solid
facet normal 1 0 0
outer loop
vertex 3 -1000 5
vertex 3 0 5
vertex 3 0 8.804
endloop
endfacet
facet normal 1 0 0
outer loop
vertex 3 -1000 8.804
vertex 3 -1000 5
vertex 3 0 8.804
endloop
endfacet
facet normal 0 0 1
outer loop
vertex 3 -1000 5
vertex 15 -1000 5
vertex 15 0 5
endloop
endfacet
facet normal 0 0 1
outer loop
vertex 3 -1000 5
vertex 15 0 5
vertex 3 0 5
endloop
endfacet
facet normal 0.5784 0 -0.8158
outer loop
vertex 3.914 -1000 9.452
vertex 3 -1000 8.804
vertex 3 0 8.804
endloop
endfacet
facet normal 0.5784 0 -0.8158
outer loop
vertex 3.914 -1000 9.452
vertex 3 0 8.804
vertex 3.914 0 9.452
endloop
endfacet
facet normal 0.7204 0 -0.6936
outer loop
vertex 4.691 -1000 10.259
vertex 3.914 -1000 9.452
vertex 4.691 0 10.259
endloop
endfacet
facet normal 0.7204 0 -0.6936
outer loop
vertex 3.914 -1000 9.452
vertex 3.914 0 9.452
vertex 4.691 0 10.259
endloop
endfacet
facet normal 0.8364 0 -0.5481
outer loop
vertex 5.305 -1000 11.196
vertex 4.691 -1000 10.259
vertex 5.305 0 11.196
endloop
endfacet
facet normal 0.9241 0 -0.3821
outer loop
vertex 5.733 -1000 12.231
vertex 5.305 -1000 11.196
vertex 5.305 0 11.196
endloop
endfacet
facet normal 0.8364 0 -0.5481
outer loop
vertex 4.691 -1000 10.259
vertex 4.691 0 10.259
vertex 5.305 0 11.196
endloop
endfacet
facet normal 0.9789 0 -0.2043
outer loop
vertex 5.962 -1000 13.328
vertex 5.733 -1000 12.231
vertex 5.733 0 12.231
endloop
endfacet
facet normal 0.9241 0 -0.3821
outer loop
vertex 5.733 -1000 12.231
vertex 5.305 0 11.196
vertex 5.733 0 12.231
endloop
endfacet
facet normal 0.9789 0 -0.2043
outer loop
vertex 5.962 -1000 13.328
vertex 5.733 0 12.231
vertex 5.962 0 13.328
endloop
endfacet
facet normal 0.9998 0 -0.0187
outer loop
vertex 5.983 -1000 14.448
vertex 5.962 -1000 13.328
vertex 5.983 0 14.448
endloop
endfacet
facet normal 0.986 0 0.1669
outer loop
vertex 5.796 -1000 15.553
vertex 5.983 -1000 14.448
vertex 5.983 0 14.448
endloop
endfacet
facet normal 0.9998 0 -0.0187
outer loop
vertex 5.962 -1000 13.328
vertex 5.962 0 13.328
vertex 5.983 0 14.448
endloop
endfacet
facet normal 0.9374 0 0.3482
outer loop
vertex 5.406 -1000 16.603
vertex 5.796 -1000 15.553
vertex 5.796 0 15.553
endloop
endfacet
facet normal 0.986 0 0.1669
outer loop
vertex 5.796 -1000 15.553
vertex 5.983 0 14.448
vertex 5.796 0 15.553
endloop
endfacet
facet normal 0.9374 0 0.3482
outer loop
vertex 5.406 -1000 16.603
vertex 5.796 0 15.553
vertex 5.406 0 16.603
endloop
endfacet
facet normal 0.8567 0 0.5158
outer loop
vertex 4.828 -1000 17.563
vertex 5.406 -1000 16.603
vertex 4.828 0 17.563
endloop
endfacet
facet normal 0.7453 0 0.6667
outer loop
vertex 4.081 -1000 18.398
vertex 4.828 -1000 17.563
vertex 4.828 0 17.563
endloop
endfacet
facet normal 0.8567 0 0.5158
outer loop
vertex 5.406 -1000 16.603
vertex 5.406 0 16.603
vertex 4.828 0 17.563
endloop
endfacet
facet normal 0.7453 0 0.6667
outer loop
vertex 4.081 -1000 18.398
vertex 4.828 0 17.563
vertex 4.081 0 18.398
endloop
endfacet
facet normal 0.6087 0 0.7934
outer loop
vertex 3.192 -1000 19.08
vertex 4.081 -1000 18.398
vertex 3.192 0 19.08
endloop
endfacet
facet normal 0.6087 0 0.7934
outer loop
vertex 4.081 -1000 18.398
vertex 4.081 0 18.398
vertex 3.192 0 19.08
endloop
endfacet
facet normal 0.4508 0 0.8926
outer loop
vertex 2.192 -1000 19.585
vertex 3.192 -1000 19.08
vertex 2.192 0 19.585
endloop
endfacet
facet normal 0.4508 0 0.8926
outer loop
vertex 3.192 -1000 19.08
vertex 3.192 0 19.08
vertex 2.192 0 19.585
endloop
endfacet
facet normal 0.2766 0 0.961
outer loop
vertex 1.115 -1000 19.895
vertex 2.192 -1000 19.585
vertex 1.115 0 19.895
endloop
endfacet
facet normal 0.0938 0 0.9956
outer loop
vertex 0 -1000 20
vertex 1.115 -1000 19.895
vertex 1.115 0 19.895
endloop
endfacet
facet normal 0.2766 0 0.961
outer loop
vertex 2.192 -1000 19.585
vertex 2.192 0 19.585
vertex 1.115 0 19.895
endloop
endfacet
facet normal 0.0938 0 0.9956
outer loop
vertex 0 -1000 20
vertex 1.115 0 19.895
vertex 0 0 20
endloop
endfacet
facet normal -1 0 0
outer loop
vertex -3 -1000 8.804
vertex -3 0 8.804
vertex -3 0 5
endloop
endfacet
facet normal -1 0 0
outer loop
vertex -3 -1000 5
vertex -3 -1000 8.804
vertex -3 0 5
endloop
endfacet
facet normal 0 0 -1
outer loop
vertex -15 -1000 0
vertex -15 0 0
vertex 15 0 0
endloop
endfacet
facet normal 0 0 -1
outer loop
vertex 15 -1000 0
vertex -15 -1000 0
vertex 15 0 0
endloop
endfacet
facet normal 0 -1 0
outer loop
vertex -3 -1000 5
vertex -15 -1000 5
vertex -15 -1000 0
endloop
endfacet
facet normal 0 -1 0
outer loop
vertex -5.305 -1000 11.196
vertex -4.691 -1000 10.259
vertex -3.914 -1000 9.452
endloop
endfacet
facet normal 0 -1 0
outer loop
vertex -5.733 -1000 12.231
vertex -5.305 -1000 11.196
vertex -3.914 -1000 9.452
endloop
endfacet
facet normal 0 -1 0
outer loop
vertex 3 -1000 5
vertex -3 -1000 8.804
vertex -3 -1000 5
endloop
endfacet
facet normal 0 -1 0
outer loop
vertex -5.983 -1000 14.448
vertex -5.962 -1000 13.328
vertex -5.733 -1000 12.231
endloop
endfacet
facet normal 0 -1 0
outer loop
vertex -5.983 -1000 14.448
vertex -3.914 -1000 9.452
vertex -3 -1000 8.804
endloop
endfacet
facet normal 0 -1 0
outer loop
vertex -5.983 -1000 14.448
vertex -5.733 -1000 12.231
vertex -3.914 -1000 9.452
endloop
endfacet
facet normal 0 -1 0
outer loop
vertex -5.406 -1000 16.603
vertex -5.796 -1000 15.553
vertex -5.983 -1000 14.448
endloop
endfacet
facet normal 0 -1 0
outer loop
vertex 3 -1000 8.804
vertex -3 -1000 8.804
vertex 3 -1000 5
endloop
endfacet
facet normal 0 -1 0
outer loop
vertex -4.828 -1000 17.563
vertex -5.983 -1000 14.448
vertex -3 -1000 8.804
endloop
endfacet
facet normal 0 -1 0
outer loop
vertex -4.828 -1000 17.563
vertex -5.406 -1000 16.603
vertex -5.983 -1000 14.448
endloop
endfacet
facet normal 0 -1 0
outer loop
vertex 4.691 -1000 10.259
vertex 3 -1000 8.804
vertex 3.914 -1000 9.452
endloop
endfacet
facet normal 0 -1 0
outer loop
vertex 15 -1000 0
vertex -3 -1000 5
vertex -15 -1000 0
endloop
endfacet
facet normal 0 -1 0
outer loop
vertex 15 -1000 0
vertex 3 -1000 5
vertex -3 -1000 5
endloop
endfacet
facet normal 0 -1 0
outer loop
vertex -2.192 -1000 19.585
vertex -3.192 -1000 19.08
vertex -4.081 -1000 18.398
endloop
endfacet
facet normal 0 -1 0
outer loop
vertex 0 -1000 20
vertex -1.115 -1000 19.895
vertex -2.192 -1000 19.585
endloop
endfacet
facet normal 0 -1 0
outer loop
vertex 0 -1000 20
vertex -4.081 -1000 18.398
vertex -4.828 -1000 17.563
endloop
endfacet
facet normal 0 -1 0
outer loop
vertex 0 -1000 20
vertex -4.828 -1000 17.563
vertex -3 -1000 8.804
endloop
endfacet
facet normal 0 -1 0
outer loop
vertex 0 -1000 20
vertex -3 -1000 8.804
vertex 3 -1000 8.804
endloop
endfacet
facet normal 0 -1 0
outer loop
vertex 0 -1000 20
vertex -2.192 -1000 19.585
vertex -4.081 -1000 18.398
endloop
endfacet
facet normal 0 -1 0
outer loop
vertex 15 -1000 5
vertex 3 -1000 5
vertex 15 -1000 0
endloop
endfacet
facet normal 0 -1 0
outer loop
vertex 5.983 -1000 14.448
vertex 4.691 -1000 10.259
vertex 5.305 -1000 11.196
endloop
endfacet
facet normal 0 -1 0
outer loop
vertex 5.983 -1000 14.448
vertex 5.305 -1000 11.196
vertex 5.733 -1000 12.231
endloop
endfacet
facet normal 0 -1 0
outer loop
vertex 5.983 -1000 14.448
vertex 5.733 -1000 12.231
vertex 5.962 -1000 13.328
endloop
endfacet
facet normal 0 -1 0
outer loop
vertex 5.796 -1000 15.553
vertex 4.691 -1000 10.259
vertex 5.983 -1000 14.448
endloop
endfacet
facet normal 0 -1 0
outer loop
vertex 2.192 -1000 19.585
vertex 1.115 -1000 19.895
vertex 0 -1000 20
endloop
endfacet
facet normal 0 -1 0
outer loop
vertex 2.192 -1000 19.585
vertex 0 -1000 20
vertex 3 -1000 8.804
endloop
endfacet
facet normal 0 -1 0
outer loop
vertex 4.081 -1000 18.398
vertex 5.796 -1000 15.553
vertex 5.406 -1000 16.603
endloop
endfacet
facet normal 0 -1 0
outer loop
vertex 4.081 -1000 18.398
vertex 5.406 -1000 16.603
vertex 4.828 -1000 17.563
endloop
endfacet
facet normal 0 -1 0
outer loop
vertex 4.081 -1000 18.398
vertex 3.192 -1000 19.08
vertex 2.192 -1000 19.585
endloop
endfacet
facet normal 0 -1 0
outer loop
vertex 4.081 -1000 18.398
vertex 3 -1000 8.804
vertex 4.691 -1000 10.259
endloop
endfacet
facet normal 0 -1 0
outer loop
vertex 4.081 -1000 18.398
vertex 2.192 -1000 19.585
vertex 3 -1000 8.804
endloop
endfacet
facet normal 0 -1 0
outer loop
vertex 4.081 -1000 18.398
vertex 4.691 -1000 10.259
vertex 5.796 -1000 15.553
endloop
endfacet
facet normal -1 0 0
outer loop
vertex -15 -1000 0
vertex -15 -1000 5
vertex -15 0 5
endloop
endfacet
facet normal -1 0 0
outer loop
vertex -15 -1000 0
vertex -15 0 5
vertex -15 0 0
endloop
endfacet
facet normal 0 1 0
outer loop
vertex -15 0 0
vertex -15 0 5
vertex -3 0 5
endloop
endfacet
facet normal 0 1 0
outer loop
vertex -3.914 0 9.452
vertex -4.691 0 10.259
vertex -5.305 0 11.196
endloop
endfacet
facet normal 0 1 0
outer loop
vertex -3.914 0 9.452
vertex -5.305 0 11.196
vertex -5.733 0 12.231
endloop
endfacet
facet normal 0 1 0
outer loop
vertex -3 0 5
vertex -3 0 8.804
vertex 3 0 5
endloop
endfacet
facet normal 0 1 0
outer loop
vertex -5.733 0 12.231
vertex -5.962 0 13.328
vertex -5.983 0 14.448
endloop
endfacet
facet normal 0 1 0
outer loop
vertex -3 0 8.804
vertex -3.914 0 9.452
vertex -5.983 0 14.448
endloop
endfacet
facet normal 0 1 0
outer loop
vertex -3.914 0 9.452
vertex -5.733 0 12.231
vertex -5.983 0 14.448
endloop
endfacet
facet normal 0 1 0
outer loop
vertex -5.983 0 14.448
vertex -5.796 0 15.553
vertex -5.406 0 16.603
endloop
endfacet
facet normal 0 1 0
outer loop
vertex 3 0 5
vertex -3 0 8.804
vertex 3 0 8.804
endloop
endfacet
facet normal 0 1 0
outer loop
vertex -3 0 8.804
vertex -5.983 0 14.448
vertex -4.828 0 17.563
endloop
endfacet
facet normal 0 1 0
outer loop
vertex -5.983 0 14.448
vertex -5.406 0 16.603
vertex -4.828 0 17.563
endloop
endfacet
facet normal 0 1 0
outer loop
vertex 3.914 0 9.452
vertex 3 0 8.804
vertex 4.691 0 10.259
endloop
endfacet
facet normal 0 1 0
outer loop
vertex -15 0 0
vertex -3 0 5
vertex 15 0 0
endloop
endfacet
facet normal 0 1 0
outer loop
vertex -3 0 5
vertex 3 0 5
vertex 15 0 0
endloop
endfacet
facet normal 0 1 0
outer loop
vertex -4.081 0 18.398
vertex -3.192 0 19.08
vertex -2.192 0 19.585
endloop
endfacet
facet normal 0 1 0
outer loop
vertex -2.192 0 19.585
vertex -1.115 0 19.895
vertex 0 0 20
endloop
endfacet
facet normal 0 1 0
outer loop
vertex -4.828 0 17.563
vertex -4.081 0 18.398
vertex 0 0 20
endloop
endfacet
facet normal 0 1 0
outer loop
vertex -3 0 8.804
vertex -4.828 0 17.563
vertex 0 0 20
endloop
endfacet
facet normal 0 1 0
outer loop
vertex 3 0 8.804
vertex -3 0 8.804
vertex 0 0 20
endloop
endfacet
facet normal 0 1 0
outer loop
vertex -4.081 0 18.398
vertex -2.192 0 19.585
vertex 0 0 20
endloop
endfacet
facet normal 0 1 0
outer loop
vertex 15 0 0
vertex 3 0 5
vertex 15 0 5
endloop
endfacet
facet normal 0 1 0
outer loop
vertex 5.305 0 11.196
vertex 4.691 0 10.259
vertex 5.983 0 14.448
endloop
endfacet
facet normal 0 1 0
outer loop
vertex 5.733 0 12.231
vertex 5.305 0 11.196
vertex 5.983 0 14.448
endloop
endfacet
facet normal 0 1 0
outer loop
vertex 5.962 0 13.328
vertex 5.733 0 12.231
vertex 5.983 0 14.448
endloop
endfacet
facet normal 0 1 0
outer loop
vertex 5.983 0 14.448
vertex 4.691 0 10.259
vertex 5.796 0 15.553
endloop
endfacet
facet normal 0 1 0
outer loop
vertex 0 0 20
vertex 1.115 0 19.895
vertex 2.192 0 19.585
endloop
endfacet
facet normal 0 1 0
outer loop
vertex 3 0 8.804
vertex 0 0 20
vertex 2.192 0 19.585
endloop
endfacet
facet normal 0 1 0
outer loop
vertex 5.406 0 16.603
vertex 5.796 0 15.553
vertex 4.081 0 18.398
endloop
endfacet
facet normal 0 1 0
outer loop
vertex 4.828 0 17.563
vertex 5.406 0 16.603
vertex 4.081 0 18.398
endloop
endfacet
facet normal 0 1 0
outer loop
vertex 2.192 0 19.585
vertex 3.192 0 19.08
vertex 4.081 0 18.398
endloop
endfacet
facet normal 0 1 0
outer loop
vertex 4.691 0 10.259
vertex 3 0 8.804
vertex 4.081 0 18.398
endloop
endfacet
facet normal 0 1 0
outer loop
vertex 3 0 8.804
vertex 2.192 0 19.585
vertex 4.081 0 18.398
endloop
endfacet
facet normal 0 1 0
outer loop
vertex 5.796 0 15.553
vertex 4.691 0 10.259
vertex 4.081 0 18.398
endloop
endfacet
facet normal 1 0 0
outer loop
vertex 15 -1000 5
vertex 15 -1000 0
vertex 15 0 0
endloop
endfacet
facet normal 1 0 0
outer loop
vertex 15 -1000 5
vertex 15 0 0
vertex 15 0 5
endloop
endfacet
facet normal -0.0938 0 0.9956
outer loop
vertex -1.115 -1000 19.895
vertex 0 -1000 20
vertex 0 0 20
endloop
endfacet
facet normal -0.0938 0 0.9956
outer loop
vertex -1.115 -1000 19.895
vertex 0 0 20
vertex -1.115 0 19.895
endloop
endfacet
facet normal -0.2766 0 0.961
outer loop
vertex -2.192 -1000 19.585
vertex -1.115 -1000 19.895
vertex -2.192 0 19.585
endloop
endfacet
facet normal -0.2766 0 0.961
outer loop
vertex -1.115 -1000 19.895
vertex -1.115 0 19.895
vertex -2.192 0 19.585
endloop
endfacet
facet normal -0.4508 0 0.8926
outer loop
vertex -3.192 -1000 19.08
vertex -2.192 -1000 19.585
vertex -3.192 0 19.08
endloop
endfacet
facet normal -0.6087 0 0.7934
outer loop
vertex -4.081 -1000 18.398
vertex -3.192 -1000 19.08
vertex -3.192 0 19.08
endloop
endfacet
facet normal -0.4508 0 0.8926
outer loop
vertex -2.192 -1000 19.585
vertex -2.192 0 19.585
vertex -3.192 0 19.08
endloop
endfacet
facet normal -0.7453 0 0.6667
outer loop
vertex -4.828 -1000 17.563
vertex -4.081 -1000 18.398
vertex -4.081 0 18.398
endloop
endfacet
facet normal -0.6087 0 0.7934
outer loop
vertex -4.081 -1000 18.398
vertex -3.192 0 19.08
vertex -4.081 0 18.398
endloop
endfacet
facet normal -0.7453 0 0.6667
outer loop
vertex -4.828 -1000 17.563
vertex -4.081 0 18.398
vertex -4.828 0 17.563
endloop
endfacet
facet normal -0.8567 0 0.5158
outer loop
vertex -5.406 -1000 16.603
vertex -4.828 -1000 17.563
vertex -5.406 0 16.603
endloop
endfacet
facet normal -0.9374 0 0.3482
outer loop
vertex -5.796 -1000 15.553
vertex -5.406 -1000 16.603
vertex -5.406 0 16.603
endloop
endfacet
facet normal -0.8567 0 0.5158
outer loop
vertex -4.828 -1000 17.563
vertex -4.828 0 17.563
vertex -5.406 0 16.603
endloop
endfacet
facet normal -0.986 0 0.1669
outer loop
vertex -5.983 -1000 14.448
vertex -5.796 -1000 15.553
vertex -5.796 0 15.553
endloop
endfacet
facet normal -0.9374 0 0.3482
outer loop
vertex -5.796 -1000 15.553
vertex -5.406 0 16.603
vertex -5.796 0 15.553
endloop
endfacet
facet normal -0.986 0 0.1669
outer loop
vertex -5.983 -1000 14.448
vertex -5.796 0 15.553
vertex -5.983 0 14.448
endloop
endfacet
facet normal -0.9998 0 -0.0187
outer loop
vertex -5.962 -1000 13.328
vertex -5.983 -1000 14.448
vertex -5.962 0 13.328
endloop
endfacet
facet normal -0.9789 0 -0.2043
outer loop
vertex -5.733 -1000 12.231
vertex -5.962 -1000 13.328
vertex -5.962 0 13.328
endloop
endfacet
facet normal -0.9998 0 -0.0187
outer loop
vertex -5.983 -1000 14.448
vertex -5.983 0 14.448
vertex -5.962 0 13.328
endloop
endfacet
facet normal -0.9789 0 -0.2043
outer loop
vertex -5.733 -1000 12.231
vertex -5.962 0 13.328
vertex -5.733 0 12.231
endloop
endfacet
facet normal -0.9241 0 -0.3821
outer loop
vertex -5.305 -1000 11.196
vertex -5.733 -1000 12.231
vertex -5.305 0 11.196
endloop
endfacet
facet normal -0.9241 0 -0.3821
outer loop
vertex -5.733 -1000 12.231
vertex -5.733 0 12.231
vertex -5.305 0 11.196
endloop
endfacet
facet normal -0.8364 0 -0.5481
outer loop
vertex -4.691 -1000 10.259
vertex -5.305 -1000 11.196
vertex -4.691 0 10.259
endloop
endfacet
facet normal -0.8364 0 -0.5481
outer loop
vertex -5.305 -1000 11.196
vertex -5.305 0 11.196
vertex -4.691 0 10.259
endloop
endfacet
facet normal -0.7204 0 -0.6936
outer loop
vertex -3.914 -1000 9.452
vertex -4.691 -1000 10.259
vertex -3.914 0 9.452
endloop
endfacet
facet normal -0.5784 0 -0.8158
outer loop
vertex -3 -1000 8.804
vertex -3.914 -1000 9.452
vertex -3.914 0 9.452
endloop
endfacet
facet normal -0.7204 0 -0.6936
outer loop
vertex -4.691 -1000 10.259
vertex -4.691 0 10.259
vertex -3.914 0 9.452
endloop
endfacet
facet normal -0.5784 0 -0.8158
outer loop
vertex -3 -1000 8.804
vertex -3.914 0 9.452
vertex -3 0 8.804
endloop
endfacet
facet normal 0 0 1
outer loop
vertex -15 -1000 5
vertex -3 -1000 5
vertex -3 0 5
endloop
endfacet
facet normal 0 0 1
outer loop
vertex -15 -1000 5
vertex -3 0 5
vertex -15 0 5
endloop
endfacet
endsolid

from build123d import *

# Parameters (mm, degrees)
F1_DEPTH = 1000


with BuildPart() as f1:
    # F0 (on Front) → F1 (new body)
    with BuildSketch(Plane.XZ):
        with BuildLine():
            Line((-15, 0), (0, 0))
            Line((0, 0), (15, 0))
            Line((15, 0), (15, 5))
            Line((15, 5), (3, 5))
            Line((3, 5), (3, 8.803848))
            ThreePointArc((3, 8.803848), (5.795555, 15.552914), (0, 20))
            ThreePointArc((0, 20), (-5.795555, 15.552914), (-3, 8.803848))
            Line((-3, 8.803848), (-3, 5))
            Line((-3, 5), (-15, 5))
            Line((-15, 5), (-15, 0))
        make_face()
    extrude(amount=F1_DEPTH)


solid = f1.part
